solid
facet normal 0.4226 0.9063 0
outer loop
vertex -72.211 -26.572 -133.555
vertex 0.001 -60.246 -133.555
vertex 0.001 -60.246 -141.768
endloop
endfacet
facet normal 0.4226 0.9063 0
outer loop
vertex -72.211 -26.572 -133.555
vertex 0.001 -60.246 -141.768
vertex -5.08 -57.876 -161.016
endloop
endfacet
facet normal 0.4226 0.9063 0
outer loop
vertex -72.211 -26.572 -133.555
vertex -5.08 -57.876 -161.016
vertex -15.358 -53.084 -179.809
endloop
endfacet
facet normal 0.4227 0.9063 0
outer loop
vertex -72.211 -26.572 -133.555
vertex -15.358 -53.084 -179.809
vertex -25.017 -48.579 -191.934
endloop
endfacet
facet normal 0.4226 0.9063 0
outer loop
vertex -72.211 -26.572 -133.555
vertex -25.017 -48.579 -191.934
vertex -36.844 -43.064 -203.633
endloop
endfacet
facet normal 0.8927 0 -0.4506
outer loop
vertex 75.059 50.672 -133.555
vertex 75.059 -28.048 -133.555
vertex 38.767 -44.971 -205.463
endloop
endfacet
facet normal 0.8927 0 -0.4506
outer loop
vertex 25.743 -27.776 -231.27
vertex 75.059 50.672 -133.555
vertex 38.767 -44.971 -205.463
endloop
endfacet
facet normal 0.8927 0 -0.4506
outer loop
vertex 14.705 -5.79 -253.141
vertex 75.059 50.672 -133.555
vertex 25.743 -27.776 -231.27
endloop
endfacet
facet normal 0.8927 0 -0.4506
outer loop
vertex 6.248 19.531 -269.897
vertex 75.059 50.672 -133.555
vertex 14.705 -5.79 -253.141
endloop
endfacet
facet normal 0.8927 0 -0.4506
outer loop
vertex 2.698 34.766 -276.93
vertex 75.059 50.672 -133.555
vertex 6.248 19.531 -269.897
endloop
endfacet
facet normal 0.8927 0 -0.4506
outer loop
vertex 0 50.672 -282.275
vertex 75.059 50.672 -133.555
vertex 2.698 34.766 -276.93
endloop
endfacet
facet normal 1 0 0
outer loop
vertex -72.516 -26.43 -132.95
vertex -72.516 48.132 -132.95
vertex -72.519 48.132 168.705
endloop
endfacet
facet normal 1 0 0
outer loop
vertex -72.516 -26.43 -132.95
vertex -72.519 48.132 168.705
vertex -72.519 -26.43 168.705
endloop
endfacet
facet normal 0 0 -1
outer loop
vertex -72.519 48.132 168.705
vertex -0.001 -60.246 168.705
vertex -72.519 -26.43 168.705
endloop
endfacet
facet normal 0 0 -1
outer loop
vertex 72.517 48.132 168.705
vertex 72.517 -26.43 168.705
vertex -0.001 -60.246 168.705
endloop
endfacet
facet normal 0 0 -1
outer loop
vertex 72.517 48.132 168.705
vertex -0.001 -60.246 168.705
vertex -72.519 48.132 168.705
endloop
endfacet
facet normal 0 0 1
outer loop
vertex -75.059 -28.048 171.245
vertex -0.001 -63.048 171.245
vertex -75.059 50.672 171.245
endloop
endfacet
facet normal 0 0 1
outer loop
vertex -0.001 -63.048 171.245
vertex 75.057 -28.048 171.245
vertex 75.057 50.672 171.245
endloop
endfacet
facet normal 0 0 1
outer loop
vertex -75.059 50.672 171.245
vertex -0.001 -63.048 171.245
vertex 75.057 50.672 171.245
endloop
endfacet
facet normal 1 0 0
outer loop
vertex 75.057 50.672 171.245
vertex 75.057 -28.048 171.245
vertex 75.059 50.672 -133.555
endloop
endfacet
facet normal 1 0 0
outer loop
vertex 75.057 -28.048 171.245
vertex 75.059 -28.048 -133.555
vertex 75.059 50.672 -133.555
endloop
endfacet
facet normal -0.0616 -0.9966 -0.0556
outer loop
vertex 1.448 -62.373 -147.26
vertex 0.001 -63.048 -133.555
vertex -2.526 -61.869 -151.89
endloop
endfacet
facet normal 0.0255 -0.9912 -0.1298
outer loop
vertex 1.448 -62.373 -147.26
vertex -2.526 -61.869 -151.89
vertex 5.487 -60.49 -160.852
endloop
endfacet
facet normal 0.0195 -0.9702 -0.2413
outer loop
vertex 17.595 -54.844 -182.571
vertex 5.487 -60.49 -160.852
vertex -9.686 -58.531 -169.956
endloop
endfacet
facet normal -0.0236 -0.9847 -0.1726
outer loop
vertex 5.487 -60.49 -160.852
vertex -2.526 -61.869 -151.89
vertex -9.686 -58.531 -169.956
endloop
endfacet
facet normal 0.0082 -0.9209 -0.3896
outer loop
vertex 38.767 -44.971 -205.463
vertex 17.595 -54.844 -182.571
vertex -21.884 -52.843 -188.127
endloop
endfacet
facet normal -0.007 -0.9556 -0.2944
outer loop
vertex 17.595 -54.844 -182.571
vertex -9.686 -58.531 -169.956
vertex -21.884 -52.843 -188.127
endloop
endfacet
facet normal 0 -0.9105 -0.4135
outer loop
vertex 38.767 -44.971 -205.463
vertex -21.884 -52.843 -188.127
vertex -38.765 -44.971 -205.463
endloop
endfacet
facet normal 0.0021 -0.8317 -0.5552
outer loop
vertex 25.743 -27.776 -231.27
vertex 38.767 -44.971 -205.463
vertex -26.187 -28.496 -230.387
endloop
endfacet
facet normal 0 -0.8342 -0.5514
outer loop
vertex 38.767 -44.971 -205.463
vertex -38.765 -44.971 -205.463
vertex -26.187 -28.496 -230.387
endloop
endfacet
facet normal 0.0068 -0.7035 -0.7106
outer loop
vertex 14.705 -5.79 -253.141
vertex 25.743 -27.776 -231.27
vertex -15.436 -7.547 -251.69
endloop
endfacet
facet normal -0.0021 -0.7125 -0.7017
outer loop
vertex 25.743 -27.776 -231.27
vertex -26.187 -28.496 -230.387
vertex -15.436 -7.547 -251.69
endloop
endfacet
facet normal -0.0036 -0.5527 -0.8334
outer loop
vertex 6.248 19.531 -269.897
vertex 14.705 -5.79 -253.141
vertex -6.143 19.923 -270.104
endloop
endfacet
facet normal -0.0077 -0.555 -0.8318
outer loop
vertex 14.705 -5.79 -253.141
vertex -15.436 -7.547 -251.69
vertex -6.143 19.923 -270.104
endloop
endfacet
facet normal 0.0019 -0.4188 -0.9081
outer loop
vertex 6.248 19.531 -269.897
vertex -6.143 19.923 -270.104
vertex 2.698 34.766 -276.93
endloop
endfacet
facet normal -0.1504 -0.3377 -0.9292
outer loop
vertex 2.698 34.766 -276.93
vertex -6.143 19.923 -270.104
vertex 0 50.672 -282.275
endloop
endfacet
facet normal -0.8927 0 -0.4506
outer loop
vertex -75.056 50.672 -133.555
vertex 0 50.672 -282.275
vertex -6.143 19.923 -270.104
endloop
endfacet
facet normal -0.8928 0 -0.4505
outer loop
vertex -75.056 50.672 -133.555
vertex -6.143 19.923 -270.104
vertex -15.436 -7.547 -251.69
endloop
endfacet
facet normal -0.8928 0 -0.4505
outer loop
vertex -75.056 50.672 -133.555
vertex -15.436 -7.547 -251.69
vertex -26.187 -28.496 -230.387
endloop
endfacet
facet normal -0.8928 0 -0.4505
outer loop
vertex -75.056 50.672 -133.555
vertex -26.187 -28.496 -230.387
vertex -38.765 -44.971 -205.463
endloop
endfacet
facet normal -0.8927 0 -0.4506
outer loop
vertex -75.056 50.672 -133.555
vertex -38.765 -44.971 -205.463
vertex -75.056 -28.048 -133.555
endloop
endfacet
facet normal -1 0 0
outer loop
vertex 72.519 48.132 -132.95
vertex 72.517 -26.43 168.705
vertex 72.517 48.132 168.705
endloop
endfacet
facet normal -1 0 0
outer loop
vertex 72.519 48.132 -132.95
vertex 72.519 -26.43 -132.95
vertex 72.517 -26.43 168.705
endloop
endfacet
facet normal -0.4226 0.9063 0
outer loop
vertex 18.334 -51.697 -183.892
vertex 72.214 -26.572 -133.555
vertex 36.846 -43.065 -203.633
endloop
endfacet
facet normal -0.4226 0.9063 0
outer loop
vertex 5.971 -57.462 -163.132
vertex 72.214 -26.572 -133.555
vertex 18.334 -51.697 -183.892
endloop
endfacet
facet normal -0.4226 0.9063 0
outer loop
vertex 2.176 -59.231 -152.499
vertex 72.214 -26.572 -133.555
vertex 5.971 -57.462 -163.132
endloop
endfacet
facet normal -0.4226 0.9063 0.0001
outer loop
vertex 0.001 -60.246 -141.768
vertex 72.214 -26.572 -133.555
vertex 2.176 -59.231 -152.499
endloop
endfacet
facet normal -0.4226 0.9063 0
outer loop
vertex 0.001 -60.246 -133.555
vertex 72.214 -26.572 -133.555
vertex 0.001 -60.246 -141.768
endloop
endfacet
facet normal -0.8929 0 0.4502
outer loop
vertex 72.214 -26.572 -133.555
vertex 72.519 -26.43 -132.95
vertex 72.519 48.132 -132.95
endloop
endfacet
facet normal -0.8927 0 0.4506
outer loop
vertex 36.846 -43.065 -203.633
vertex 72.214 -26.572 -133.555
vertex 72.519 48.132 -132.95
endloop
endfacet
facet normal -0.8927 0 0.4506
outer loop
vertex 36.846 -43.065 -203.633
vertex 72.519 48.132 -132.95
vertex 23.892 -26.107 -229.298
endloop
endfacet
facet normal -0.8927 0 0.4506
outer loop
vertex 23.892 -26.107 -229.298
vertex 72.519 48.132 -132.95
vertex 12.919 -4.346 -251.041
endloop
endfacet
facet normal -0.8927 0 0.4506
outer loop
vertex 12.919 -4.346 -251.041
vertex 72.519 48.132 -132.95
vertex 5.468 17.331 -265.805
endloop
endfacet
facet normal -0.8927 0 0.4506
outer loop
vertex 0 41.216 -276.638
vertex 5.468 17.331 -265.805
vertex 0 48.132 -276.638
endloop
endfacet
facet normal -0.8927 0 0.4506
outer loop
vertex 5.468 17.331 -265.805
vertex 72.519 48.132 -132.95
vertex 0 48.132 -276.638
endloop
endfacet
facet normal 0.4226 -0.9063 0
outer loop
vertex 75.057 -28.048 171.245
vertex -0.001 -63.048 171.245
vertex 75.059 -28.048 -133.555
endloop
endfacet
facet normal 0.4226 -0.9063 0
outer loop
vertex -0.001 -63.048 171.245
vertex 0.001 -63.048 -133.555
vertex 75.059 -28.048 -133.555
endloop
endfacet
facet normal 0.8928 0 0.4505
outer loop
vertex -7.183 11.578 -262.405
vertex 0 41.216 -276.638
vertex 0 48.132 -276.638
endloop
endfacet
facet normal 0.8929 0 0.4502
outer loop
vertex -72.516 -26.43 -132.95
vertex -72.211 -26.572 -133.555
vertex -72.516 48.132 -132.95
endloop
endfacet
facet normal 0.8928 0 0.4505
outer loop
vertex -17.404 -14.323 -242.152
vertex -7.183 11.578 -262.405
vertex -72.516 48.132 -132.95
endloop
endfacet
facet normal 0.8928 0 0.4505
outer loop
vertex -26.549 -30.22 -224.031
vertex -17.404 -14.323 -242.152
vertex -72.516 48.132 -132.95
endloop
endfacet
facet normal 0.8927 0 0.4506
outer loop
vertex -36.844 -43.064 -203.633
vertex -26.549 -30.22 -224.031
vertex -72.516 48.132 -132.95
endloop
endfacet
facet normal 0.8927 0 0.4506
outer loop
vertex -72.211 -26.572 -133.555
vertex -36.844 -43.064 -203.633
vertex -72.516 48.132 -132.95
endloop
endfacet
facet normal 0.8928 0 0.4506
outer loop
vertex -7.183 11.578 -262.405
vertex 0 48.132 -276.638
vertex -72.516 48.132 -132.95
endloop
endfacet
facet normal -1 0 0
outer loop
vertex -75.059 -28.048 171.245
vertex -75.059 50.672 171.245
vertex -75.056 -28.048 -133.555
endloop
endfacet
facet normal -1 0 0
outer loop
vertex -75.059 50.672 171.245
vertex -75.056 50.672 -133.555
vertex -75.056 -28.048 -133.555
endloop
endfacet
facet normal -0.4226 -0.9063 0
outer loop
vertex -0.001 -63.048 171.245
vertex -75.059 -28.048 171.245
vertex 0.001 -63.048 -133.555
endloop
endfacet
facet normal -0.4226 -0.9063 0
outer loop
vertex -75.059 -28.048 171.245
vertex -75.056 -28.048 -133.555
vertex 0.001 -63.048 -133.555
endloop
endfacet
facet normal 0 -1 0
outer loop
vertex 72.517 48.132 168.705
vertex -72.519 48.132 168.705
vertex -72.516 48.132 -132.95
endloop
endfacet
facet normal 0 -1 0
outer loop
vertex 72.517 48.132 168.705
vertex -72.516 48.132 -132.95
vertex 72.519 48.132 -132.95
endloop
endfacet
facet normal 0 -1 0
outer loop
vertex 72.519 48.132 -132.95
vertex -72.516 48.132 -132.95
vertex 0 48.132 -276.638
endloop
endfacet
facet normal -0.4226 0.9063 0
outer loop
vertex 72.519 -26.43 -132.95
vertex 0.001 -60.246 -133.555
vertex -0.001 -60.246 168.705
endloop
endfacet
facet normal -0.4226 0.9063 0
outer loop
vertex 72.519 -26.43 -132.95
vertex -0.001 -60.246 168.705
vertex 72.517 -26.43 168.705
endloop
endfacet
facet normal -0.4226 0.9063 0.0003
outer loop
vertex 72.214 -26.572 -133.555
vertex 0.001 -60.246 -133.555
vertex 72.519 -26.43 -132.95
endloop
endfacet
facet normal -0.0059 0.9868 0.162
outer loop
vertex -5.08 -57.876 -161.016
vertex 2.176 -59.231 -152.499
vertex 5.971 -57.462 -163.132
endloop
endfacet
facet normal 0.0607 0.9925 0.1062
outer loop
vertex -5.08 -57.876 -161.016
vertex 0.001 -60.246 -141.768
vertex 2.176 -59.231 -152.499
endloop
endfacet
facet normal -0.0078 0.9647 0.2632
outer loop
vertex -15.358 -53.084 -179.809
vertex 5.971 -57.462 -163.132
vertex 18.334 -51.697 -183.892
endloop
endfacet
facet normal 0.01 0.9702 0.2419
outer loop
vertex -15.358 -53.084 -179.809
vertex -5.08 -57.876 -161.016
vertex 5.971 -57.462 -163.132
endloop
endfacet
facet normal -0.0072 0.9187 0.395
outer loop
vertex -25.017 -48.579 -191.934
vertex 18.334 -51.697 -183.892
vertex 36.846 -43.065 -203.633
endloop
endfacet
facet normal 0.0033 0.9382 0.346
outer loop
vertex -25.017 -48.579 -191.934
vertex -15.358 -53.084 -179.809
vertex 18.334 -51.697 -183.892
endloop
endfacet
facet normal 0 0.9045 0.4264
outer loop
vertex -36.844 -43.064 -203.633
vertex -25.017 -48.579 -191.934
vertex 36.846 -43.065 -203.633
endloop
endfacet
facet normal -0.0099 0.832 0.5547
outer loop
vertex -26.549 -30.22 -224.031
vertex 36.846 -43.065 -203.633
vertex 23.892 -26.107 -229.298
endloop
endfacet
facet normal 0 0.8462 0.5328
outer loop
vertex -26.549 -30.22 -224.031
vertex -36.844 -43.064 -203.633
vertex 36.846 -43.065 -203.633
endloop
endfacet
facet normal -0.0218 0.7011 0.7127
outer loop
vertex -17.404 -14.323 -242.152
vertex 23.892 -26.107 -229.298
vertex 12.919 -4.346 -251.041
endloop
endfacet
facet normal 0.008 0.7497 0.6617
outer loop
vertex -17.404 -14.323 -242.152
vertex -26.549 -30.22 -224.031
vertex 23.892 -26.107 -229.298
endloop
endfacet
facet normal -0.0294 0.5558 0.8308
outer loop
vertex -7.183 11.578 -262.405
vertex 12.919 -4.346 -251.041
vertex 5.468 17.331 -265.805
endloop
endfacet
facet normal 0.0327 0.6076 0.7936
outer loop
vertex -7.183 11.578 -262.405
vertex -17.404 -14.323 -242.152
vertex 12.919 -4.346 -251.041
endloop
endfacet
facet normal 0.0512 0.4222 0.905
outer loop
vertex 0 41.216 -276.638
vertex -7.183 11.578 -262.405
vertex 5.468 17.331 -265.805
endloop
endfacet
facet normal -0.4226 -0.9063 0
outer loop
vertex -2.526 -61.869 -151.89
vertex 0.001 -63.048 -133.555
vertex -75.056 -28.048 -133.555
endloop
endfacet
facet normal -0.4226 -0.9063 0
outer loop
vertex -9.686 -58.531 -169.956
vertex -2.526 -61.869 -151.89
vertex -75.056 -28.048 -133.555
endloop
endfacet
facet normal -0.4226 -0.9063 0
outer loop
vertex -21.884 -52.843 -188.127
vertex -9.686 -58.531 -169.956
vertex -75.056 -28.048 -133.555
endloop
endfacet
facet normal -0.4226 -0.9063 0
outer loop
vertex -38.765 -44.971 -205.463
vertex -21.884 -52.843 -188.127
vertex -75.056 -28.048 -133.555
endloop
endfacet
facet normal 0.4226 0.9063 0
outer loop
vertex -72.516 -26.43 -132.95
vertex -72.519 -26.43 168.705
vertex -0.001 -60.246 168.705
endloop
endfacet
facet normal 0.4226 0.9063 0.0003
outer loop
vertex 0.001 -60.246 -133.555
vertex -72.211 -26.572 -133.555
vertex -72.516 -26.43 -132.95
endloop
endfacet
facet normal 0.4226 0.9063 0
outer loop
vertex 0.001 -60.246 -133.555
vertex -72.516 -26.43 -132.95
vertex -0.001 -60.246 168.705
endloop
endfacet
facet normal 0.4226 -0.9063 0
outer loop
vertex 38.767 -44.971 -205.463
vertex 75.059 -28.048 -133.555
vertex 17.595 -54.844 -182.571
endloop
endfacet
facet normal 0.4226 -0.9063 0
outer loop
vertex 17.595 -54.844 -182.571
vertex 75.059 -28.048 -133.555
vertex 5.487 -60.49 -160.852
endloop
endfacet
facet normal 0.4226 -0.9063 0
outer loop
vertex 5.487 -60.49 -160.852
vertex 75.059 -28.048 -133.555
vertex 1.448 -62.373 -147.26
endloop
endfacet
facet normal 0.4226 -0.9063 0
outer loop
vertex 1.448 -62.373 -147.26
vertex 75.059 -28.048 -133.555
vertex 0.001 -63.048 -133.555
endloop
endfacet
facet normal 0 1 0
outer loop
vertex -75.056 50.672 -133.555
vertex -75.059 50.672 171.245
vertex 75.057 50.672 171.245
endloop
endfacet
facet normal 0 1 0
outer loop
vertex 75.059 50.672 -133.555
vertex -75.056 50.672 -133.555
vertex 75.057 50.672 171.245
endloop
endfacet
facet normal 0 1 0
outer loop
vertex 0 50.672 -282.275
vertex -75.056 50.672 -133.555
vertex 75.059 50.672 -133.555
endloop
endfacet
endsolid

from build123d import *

# Parameters (mm, degrees)
TOP_BOW_EXTRUSION_DEPTH              = 56.86004
PORT_STARBOARD_CUT_DEPTH             = 38.529378828
PORT_STARBOARD_CUT_DEPTH_BACK        = 38.529527124
FORE_AFT_BOW_WRAPUP_EXTRUSTION_REACH = 76.36
SCALE_2_SCALE                        = 2
SHELL2_T                             = 2.54


with BuildPart() as part:
    # Cross-Section C Sketch → Fore-Aft Loft section 0
    with BuildSketch(Plane.XY.offset(76.2)):
        Polygon((-0.000593186, -30.406404979), (37.528192355, -12.906444879), (37.528192355, 26.453635249), (-37.529378728, 26.453635249), (-37.529378728, -12.906444879), align=None)
    # Cross-Section B Sketch → Fore-Aft Loft section 1
    with BuildSketch(Plane.XY):
        Polygon((-0.000593186, -30.406404979), (37.528192355, -12.906444879), (37.528192355, 26.453635249), (-37.529378728, 26.453635249), (-37.529378728, -12.906444879), align=None)
    # Cross-Section A Sketch → Fore-Aft Loft section 2
    with BuildSketch(Plane(origin=(0, 0, -76.2), x_dir=(-1, 0, 0), z_dir=(0, 0, -1))):
        Polygon((-0.000593186, -30.406404979), (37.528192355, -12.906444879), (37.528192355, 26.453635249), (-37.529378728, 26.453635249), (-37.529378728, -12.906444879), align=None)
    loft()

    # Top Bow Profile → Top Bow Extrusion (add)
    with BuildSketch(Plane(origin=(0, 26.453635249, 0), x_dir=(1, 0, 0), z_dir=(0, 1, 0))):
        Polygon((37.529378728, 76.2), (0, 150.560276873), (-37.528192355, 76.2), align=None)
    extrude(amount=-TOP_BOW_EXTRUSION_DEPTH)

    # Port-Starboard Profile → Port-Starboard Cut (cut, two sides)
    with BuildSketch(Plane(origin=(0, 0, 0), x_dir=(0, 0, -1), z_dir=(1, 0, 0))) as port_starboard_cut_sk:
        with BuildLine():
            ThreePointArc((76.2, -30.406404979), (122.925878209, -14.460087823), (150.560276873, 26.453635249))
            Line((150.560276873, 26.453635249), (150.560276873, -30.406404979))
            Line((150.560276873, -30.406404979), (76.2, -30.406404979))
        make_face()
    extrude(amount=PORT_STARBOARD_CUT_DEPTH, mode=Mode.SUBTRACT)
    extrude(port_starboard_cut_sk.sketch, amount=-PORT_STARBOARD_CUT_DEPTH_BACK, mode=Mode.SUBTRACT)

    # Fore-Aft Bow Construction Sketch → Fore-aft bow wrapup extrustion (cut, up to next)
    with BuildSketch(Plane.XY.offset(-76.2), mode=Mode.PRIVATE) as fore_aft_bow_wrapup_extrustion_sk1:
        Polygon((0.000593186, -30.406404979), (37.529378728, -30.406404979), (37.529378728, -12.906444879), align=None)
    fore_aft_bow_wrapup_extrustion_tool1 = extrude(fore_aft_bow_wrapup_extrustion_sk1.sketch, amount=-FORE_AFT_BOW_WRAPUP_EXTRUSTION_REACH, mode=Mode.PRIVATE) & part.part
    add(fore_aft_bow_wrapup_extrustion_tool1.solids().sort_by_distance((25.019784, -24.573085, -76.2))[0], mode=Mode.SUBTRACT)
    # Fore-Aft Bow Construction Sketch → Fore-aft bow wrapup extrustion (cut, up to next)
    with BuildSketch(Plane.XY.offset(-76.2), mode=Mode.PRIVATE) as fore_aft_bow_wrapup_extrustion_sk2:
        Polygon((-37.528192355, -30.406404979), (0.000593186, -30.406404979), (-37.528192355, -12.906444879), align=None)
    fore_aft_bow_wrapup_extrustion_tool2 = extrude(fore_aft_bow_wrapup_extrustion_sk2.sketch, amount=-FORE_AFT_BOW_WRAPUP_EXTRUSTION_REACH, mode=Mode.PRIVATE) & part.part
    add(fore_aft_bow_wrapup_extrustion_tool2.solids().sort_by_distance((-25.018597, -24.573085, -76.2))[0], mode=Mode.SUBTRACT)


with BuildPart() as part_1:
    # Scale 2: scaled about (-0.000240035, 2.235376986, -18.845056047)
    add(part.part.scale(SCALE_2_SCALE).moved(Location((0.000240035, -2.235376986, 18.845056047))))

    # Shell2 (no face opened: a closed hollow body)
    add(offset(amount=-SHELL2_T, mode=Mode.PRIVATE), mode=Mode.SUBTRACT)


solid = part_1.part
